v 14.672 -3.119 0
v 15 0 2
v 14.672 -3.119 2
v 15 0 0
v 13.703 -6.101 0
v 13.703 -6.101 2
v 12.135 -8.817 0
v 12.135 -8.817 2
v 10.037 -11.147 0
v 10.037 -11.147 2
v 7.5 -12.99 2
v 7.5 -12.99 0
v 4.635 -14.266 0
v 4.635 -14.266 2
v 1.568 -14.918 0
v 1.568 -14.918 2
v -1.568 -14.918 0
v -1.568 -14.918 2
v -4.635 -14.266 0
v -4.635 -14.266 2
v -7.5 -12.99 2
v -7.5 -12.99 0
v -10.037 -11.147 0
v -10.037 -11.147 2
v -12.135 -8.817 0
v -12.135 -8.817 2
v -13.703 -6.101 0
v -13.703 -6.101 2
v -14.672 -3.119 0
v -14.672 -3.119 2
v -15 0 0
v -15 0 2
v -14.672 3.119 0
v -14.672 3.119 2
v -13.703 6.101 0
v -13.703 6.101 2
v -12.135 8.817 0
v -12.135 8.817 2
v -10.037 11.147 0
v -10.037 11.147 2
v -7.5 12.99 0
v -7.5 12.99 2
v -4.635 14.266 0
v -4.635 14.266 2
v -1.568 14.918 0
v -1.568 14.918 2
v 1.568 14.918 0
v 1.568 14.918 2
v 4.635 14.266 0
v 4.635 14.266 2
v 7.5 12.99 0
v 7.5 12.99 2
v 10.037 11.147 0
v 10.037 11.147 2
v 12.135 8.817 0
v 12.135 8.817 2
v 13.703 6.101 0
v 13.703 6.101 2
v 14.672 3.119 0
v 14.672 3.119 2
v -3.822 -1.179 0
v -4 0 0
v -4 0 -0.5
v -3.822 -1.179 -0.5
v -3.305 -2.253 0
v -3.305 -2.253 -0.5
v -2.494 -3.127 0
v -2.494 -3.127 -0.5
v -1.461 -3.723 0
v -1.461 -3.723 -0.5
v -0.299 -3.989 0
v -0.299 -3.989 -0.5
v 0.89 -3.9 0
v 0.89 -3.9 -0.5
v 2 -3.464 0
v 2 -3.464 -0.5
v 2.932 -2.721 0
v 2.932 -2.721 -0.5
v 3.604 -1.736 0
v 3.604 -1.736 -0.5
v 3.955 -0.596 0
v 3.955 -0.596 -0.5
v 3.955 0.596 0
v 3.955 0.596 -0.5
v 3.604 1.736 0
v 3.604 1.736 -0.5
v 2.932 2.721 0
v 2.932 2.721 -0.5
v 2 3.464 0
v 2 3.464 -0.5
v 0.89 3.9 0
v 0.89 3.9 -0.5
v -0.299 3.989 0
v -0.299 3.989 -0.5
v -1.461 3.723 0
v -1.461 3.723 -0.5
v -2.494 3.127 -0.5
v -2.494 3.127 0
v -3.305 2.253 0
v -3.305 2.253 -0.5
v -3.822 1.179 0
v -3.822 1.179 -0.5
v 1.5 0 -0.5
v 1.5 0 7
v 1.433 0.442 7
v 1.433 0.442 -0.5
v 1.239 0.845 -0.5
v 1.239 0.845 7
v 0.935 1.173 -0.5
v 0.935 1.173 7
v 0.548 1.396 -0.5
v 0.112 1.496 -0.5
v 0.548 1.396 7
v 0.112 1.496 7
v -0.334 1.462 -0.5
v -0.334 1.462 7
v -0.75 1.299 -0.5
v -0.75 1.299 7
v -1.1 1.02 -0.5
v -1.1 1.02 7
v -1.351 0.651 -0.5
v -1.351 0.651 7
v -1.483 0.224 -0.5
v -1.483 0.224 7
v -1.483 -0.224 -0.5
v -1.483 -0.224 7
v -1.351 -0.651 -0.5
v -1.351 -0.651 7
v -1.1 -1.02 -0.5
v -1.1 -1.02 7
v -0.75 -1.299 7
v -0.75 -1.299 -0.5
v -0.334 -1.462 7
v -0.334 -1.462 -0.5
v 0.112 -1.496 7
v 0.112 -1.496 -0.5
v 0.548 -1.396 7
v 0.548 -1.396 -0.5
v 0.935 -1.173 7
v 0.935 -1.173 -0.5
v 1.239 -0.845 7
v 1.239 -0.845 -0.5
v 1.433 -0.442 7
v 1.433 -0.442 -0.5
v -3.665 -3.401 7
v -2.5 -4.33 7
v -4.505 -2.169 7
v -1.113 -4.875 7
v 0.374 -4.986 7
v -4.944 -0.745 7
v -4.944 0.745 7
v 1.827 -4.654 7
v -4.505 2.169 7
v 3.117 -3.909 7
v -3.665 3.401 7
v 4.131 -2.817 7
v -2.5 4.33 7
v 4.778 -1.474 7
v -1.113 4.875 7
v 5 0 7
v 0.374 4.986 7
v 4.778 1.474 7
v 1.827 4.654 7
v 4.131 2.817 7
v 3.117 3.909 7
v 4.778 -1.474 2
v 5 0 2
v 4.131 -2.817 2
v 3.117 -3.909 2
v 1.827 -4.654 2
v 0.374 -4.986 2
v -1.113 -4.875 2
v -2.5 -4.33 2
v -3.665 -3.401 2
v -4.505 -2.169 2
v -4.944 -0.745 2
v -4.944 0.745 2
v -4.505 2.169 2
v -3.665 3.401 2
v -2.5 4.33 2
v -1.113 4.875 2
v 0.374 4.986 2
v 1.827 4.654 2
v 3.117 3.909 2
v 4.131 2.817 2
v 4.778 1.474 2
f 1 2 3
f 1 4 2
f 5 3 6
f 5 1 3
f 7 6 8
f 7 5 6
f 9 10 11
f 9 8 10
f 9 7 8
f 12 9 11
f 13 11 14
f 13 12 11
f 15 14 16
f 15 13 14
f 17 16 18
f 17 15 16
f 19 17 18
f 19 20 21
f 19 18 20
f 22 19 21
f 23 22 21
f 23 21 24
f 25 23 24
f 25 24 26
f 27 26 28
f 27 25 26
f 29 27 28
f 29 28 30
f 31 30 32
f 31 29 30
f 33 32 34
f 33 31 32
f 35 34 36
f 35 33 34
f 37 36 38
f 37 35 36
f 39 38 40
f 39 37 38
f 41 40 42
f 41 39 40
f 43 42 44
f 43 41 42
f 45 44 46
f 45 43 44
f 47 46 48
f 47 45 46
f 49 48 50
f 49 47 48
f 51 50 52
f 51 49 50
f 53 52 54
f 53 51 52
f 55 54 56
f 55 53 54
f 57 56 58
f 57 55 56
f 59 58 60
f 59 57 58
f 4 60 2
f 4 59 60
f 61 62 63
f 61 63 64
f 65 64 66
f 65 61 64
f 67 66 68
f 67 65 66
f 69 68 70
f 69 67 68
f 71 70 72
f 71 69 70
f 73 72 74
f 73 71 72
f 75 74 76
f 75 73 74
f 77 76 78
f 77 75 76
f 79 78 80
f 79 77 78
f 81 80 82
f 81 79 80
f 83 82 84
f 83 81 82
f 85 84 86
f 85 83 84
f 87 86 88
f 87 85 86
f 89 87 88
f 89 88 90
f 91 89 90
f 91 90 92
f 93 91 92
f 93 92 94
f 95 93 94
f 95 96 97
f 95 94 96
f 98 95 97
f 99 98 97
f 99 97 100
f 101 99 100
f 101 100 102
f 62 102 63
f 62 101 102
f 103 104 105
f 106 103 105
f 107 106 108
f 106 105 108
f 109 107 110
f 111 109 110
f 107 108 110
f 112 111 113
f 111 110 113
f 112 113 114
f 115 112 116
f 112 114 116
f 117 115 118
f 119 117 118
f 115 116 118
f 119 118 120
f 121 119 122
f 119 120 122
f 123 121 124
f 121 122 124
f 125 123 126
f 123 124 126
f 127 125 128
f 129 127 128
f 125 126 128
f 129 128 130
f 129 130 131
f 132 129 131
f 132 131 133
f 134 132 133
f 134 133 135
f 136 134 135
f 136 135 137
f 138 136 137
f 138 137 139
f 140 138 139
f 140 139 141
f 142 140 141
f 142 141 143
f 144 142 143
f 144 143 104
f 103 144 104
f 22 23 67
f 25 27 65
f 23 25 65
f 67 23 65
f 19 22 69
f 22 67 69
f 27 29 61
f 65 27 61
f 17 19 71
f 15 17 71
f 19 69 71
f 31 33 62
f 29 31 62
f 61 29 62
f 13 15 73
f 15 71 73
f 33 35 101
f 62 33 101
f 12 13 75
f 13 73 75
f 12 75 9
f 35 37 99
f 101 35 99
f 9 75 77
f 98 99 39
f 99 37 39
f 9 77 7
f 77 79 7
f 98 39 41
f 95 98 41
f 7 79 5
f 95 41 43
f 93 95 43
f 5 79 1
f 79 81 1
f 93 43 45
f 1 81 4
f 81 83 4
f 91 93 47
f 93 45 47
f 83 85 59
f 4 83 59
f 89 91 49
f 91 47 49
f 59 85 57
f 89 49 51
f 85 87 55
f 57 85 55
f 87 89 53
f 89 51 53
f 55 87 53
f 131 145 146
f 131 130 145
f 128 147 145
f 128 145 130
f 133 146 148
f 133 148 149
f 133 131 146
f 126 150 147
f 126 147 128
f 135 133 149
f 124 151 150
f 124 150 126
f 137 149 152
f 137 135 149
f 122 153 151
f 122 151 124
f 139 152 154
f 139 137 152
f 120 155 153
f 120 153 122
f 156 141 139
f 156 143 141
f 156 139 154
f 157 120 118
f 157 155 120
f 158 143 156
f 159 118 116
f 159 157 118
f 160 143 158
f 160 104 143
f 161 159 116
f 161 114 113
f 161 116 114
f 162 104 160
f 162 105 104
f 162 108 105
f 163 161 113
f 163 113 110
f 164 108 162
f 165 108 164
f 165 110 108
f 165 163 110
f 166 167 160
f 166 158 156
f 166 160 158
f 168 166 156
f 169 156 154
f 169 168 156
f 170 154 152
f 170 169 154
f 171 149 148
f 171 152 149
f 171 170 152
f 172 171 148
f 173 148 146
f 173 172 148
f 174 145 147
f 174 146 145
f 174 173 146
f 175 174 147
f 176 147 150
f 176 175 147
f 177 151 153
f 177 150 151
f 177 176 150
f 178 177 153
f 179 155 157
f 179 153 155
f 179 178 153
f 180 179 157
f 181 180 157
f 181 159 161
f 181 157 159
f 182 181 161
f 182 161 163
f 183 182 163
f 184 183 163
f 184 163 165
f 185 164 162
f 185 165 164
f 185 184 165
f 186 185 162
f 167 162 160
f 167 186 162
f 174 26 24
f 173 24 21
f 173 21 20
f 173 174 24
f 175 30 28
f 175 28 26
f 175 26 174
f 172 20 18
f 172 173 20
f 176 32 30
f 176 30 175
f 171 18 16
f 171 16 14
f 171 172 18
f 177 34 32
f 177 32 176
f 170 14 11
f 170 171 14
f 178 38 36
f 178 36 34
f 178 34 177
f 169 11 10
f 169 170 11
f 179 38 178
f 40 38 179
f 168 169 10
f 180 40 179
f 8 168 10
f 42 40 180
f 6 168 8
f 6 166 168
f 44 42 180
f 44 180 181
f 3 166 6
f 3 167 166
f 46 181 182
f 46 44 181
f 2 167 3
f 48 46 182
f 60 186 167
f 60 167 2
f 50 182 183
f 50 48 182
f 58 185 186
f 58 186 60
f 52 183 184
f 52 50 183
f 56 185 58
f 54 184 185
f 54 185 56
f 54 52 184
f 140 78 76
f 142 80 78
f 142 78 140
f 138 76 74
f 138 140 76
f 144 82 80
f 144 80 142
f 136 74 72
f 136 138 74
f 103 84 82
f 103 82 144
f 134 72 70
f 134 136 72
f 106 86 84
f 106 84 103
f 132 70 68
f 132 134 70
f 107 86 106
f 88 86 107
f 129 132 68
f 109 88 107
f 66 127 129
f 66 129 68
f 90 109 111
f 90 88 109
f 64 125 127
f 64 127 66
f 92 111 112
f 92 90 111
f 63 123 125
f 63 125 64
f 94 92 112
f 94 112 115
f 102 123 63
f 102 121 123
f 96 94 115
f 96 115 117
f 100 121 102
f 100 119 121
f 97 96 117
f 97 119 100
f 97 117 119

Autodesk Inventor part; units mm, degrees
ref_plane "YZ Plane" through (0, 0, 0) normal (1, 0, 0) x (0, 1, 0)
ref_plane "XZ Plane" through (0, 0, 0) normal (0, 1, 0) x (-1, 0, 0)
ref_plane "XY Plane" through (0, 0, 0) normal (0, 0, 1) x (1, 0, 0)
sketch "スケッチ1" plane through (0, 0, 0) normal (0, 0, 1) x (1, 0, 0)
  circle A0 centre (0, 0) radius 15
  dimension "d0" = 30
extrude "押し出し1" add sketch "スケッチ1" along normal blind 2
sketch "スケッチ2" plane through (0, 0, 2) normal (0, 0, 1) x (1, 0, 0)
  circle A0 centre (0, 0) radius 5
  dimension "d3" = 10
extrude "押し出し2" add sketch "スケッチ2" along normal blind 5
sketch "スケッチ4" plane through (0, 0, 0) normal (0, 0, -1) x (-1, 0, 0)
  circle A0 centre (0, 0) radius 4
  dimension "d9" = 8
extrude "押し出し4" add sketch "スケッチ4" along normal blind 0.5
sketch "スケッチ5" plane through (0, 0, 7) normal (0, 0, 1) x (1, 0, 0)
  circle A0 centre (0, 0) radius 1.5
  dimension "d12" = 3
extrude "押し出し5" cut sketch "スケッチ5" against normal blind 15
properties part number "Gear2_BSS0.5-30A" material "真鍮"
